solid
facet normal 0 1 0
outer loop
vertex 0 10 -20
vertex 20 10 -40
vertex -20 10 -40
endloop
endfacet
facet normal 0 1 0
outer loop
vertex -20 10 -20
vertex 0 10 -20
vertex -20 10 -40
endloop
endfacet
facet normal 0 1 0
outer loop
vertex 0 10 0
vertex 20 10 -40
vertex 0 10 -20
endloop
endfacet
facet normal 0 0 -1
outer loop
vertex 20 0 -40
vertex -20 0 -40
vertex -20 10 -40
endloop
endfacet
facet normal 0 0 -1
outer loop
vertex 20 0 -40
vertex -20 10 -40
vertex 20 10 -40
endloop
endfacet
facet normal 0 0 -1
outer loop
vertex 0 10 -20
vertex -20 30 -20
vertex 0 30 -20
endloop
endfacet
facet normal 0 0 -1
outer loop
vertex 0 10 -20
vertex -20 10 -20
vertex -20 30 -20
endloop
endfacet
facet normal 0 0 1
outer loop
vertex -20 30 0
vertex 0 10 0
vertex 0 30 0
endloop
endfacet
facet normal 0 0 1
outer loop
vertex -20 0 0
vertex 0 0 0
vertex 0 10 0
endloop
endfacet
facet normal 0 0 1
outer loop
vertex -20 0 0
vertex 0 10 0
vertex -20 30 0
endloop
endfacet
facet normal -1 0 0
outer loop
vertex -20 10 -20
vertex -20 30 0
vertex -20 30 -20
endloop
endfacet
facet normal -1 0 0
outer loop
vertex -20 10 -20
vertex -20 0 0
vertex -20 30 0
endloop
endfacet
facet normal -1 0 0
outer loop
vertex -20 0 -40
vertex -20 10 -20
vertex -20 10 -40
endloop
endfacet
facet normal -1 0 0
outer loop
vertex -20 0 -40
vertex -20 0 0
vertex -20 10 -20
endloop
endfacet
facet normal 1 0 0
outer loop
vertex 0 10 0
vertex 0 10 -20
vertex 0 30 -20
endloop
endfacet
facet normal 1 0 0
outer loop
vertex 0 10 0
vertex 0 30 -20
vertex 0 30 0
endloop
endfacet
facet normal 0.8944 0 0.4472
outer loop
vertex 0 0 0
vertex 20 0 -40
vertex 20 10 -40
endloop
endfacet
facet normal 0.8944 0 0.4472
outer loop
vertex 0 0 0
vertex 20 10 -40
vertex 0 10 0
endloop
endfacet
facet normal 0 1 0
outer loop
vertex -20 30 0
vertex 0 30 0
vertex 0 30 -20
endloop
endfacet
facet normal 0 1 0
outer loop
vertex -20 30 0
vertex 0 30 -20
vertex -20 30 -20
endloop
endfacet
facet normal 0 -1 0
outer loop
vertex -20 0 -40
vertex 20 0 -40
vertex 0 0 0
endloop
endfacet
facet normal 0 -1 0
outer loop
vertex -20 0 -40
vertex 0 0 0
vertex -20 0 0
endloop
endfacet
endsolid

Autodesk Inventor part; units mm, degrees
ref_plane "YZ Plane" through (0, 0, 0) normal (1, 0, 0) x (0, 1, 0)
ref_plane "XZ Plane" through (0, 0, 0) normal (0, 1, 0) x (-1, 0, 0)
ref_plane "XY Plane" through (0, 0, 0) normal (0, 0, 1) x (1, 0, 0)
sketch "草圖1" plane through (0, 0, 0) normal (0, 1, 0) x (-1, 0, 0)
  line L0 (0, 0) -> (20, 0)
  line L1 (20, 0) -> (20, -20)
  line L2 (20, -20) -> (0, -20)
  line L3 (0, -20) -> (0, 0)
  line L4 (20, -20) -> (20, -40)
  line L5 (20, -40) -> (-20, -40)
  line L6 (-20, -40) -> (0, 0)
  dimension "d0" = 20
  dimension "d1" = 20
  dimension "d2" = 20
  dimension "d3" = 40
extrude "擠出1" add sketch "草圖1" along normal blind 30 contours L0 L1 L2 L3
extrude "擠出2" add sketch "草圖1" along normal blind 10 contours L3 L2 L4 L5 L6
